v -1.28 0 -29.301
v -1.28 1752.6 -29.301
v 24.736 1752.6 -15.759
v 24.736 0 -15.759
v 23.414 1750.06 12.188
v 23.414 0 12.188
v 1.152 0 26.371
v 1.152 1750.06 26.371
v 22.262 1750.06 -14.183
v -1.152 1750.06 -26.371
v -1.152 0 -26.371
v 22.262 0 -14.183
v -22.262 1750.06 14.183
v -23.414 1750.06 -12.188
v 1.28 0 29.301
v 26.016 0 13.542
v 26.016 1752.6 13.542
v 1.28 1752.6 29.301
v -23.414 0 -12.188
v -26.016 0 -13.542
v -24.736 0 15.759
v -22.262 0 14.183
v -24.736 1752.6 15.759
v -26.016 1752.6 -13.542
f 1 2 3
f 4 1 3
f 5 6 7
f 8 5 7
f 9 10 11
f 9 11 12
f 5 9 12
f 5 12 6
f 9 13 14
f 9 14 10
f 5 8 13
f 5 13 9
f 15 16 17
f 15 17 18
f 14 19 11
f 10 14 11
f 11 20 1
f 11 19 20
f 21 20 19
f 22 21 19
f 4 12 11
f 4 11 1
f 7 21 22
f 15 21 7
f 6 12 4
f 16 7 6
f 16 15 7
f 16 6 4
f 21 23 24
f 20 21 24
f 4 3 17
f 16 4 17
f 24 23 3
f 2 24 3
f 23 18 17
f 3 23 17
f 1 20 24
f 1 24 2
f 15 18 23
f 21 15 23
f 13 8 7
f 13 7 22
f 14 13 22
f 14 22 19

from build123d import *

# Parameters (mm, degrees)
F1_DEPTH = 1752.6
F2_T     = -2.54


with BuildPart() as f1:
    # F0 (on Front) → F1 (new body)
    with BuildSketch(Plane.XZ):
        Polygon((-1.279764, -29.30146), (24.735926, -15.759038), (26.01569, 13.542422), (1.279764, 29.30146), (-24.735926, 15.759038), (-26.01569, -13.542422), align=None)
    extrude(amount=-F1_DEPTH)

    # F2
    f2_openings = [f1.faces().sort_by_distance(p)[0] for p in [
        (0, 0, 0),
    ]]
    offset(amount=F2_T, openings=f2_openings)


solid = f1.part
